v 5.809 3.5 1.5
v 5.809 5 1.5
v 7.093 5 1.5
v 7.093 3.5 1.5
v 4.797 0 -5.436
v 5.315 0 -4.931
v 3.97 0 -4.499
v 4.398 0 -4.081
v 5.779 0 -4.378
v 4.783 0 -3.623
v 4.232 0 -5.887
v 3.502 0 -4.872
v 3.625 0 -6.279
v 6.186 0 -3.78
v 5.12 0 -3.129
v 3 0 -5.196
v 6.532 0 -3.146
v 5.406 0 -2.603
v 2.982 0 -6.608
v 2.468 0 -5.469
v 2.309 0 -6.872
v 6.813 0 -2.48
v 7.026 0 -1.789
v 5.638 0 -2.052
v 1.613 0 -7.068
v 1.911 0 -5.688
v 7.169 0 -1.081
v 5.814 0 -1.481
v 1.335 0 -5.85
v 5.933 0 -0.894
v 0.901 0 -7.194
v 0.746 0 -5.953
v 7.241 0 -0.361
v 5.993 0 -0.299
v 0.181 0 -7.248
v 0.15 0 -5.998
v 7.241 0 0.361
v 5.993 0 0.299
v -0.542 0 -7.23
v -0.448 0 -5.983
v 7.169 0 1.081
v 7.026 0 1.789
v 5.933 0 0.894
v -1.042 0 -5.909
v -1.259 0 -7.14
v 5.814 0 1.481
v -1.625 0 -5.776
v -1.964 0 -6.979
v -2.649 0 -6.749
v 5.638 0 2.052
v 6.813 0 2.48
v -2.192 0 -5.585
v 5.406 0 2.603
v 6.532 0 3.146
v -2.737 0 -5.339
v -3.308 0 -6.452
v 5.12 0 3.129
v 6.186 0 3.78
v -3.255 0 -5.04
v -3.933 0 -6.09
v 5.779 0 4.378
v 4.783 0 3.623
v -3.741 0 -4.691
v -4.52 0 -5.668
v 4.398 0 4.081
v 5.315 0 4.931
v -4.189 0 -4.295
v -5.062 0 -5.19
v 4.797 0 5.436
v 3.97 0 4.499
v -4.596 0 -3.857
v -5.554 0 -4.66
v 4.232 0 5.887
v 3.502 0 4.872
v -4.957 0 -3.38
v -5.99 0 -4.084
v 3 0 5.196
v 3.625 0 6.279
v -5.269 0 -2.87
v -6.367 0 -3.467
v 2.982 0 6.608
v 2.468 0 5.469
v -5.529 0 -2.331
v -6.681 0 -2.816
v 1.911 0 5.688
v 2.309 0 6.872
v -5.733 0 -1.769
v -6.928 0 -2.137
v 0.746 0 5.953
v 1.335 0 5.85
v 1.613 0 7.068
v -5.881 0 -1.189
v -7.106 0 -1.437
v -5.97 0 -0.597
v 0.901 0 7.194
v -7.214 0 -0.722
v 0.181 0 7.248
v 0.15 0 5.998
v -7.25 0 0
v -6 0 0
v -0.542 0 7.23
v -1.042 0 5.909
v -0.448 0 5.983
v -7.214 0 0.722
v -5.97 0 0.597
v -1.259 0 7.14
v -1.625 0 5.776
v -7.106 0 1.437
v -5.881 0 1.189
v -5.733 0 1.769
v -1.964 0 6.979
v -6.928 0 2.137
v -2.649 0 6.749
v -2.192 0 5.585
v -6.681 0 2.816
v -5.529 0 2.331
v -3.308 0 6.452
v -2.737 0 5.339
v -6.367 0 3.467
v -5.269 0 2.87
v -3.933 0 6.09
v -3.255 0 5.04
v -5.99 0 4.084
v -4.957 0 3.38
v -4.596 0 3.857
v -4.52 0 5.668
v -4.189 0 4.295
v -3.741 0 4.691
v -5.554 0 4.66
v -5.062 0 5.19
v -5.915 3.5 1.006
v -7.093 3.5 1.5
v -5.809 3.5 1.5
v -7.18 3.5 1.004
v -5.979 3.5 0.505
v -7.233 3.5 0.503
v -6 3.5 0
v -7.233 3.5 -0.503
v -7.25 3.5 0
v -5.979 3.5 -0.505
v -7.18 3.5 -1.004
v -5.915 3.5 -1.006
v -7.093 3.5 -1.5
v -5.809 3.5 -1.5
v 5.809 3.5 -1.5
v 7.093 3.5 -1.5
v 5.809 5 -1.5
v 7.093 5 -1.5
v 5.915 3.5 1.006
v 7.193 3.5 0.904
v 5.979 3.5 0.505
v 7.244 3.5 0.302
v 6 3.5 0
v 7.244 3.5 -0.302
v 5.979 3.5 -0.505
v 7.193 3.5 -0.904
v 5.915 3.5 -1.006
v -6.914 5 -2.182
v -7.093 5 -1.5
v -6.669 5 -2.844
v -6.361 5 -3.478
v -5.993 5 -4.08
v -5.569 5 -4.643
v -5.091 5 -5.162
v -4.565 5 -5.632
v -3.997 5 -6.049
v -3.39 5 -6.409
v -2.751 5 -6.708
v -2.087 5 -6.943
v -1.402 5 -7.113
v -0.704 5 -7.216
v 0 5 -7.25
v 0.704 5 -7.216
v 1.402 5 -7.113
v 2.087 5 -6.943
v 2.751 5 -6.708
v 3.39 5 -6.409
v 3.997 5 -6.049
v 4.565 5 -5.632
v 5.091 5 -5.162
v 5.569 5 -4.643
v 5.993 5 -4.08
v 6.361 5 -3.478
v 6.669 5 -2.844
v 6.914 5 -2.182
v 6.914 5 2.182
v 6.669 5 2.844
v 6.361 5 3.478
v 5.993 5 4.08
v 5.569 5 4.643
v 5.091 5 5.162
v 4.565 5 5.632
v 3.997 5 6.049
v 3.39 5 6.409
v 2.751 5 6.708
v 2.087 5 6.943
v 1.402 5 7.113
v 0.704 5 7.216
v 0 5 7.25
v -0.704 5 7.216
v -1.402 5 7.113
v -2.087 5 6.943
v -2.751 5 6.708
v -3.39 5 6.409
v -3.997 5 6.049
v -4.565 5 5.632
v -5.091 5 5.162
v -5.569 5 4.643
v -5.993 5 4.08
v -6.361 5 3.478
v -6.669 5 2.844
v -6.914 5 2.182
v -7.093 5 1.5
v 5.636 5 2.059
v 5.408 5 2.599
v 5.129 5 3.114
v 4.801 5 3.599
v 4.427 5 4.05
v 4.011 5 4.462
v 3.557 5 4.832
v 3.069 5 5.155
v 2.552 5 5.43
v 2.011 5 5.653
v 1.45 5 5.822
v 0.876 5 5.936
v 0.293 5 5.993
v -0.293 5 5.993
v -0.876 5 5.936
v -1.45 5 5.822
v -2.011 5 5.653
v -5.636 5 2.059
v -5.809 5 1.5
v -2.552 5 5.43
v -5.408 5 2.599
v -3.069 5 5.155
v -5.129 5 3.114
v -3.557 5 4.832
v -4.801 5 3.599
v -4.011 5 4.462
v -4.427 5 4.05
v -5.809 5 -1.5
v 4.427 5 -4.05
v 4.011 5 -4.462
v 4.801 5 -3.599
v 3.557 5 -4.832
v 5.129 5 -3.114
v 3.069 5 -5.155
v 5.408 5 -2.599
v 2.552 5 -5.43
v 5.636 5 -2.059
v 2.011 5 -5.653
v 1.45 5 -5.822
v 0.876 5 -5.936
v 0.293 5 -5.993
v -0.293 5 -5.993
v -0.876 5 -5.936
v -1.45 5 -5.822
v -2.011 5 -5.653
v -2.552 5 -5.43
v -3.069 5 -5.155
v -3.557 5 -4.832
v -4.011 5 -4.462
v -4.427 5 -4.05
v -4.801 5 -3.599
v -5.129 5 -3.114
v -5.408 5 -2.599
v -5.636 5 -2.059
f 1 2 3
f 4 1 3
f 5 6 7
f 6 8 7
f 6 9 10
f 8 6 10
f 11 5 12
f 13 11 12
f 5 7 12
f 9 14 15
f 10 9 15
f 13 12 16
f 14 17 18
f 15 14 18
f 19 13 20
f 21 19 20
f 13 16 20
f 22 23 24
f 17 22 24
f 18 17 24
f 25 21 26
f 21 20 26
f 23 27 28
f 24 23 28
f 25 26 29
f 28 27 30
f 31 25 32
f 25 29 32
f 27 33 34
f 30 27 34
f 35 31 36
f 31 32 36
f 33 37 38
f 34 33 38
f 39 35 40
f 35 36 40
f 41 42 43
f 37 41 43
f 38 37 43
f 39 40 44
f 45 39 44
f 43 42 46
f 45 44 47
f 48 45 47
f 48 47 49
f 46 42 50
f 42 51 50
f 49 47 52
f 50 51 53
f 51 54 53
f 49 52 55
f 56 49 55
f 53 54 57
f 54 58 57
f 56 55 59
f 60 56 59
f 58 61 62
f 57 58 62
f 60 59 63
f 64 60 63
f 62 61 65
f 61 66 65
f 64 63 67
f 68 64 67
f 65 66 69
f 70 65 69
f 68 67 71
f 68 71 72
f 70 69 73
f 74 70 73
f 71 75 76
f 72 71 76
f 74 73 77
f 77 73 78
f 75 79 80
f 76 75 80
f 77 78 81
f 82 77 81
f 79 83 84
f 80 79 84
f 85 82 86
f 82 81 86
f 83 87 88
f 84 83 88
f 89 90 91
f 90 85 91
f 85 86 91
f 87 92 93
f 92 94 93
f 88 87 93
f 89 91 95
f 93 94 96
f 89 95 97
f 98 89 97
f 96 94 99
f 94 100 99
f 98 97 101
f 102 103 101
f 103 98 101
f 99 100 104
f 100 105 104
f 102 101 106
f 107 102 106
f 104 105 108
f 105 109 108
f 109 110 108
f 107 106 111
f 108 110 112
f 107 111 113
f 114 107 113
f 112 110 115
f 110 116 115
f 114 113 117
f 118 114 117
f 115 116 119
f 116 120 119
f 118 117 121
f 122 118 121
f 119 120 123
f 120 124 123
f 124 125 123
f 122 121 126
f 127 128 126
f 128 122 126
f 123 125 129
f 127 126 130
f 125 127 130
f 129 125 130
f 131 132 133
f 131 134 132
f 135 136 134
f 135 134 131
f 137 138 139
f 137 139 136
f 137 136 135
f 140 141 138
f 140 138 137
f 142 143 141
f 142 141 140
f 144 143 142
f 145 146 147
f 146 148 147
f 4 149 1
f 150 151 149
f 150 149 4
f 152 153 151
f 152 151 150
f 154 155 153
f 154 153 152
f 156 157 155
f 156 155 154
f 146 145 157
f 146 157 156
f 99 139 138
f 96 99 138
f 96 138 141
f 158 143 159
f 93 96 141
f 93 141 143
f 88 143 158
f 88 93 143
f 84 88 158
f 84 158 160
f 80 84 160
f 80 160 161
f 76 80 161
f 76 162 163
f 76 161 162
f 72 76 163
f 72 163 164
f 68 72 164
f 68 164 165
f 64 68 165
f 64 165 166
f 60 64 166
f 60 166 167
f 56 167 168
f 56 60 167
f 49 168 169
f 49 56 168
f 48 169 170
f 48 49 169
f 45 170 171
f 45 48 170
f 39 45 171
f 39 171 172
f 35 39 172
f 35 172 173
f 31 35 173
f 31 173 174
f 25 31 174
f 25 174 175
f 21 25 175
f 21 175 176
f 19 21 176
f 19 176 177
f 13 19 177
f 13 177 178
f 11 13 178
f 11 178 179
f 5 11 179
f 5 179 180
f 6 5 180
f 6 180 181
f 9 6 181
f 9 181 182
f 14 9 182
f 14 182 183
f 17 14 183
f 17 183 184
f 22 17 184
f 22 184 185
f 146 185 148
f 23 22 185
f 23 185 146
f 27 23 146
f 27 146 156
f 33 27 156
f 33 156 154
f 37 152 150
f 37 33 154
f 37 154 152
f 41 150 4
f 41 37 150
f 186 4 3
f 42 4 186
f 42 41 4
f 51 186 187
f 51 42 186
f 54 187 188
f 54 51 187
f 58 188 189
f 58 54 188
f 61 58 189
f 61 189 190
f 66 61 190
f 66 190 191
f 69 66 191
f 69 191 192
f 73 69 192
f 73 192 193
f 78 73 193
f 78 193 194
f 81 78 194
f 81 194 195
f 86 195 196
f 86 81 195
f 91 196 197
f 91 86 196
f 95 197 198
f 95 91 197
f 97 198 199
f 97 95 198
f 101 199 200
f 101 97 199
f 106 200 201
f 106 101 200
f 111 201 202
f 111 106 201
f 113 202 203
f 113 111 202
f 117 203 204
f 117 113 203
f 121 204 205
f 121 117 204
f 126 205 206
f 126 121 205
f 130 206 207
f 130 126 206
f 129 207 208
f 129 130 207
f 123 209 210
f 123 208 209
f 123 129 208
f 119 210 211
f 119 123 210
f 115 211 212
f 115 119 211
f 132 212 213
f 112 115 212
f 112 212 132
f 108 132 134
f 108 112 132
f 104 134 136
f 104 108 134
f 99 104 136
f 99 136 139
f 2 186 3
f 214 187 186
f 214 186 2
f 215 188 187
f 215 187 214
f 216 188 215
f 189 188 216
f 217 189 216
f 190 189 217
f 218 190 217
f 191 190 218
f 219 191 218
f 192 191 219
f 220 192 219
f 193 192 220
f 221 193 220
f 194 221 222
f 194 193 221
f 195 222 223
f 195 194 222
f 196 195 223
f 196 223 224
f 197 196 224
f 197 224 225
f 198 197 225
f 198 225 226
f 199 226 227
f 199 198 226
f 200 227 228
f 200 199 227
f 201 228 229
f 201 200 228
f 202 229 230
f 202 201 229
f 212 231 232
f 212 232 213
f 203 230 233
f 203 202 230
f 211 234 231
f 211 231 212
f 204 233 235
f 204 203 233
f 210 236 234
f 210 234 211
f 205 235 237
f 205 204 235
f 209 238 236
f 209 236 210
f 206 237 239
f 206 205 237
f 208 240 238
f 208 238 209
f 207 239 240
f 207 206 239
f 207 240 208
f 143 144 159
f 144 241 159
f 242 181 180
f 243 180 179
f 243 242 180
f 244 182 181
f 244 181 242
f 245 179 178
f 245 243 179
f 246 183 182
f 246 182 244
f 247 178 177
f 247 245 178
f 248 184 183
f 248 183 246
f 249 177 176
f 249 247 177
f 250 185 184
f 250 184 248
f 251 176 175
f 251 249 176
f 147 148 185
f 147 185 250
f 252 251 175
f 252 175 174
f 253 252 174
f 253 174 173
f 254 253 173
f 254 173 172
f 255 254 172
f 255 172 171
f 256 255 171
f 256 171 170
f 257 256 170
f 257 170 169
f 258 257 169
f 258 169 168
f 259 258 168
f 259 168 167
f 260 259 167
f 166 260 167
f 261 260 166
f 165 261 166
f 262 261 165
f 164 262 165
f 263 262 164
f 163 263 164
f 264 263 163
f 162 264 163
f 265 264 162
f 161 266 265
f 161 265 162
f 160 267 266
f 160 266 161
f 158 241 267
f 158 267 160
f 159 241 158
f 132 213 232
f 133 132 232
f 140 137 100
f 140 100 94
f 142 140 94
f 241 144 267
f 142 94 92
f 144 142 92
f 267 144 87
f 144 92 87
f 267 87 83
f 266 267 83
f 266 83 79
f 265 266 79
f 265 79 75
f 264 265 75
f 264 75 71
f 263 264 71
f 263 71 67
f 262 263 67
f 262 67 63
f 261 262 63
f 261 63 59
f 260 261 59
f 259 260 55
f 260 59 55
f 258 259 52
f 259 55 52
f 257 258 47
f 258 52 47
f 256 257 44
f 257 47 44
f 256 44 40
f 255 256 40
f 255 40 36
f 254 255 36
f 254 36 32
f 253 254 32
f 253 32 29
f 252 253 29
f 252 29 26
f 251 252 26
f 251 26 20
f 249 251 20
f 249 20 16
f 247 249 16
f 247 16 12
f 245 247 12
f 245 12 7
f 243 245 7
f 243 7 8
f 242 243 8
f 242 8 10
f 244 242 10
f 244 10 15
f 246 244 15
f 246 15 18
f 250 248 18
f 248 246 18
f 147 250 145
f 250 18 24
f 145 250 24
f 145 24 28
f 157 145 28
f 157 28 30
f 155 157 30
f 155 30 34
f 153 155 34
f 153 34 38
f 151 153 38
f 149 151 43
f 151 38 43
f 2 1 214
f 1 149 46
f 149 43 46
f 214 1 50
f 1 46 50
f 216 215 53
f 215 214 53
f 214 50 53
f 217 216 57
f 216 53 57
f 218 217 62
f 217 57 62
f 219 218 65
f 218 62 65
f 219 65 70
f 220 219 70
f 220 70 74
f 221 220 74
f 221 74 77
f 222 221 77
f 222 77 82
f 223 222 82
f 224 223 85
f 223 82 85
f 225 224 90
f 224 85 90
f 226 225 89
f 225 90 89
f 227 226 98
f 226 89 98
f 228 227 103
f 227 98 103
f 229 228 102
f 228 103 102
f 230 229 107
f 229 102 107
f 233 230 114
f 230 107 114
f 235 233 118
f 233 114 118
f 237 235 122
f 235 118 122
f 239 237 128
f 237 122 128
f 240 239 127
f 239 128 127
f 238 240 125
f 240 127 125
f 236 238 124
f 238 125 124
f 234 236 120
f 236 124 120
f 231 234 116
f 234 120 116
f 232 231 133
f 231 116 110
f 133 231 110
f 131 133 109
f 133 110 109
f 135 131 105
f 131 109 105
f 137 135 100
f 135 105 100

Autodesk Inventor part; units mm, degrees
ref_plane "YZ Plane" through (0, 0, 0) normal (1, 0, 0) x (0, 1, 0)
ref_plane "XZ Plane" through (0, 0, 0) normal (0, 1, 0) x (-1, 0, 0)
ref_plane "XY Plane" through (0, 0, 0) normal (0, 0, 1) x (1, 0, 0)
sketch "Esquisse1" plane through (0, 0, 0) normal (0, 1, 0) x (-1, 0, 0)
  circle A0 centre (0, 0) radius 7.25
  circle A1 centre (0, 0) radius 6
  dimension "d0" = 12
  dimension "d1" = 14.5
extrude "Extrusion1" add sketch "Esquisse1" along normal blind 5
sketch "Esquisse2" plane through (0, 5, 0) normal (0, 1, 0) x (1, 0, 0)
  line L0 (-8, -1.5) -> (-5, -1.5)
  line L1 (-5, -1.5) -> (-5, 1.5)
  line L2 (-5, 1.5) -> (-8, 1.5)
  line L3 (-8, 1.5) -> (-8, -1.5)
  line L4 (5, -1.5) -> (8, -1.5)
  line L5 (8, -1.5) -> (8, 1.5)
  line L6 (8, 1.5) -> (5, 1.5)
  line L7 (5, 1.5) -> (5, -1.5)
  point P0 (0, 0)
  dimension "d4" = 3
  dimension "d5" = 1.5
  dimension "d6" = 3
  dimension "d7" = 3
  dimension "d8" = 5
  dimension "d9" = 5
extrude "Extrusion2" cut sketch "Esquisse2" against normal blind 1.5
thread "Filetage1" size "M12x0.5" class "6H" standard "ANSI Metric M Profile" length 8 offset 2
equation "\"d5\" = 0.5 * d4"
equation "\"d9\" = d8"
properties part number "Bague Prise Banane" material "Aluminium 6061"
